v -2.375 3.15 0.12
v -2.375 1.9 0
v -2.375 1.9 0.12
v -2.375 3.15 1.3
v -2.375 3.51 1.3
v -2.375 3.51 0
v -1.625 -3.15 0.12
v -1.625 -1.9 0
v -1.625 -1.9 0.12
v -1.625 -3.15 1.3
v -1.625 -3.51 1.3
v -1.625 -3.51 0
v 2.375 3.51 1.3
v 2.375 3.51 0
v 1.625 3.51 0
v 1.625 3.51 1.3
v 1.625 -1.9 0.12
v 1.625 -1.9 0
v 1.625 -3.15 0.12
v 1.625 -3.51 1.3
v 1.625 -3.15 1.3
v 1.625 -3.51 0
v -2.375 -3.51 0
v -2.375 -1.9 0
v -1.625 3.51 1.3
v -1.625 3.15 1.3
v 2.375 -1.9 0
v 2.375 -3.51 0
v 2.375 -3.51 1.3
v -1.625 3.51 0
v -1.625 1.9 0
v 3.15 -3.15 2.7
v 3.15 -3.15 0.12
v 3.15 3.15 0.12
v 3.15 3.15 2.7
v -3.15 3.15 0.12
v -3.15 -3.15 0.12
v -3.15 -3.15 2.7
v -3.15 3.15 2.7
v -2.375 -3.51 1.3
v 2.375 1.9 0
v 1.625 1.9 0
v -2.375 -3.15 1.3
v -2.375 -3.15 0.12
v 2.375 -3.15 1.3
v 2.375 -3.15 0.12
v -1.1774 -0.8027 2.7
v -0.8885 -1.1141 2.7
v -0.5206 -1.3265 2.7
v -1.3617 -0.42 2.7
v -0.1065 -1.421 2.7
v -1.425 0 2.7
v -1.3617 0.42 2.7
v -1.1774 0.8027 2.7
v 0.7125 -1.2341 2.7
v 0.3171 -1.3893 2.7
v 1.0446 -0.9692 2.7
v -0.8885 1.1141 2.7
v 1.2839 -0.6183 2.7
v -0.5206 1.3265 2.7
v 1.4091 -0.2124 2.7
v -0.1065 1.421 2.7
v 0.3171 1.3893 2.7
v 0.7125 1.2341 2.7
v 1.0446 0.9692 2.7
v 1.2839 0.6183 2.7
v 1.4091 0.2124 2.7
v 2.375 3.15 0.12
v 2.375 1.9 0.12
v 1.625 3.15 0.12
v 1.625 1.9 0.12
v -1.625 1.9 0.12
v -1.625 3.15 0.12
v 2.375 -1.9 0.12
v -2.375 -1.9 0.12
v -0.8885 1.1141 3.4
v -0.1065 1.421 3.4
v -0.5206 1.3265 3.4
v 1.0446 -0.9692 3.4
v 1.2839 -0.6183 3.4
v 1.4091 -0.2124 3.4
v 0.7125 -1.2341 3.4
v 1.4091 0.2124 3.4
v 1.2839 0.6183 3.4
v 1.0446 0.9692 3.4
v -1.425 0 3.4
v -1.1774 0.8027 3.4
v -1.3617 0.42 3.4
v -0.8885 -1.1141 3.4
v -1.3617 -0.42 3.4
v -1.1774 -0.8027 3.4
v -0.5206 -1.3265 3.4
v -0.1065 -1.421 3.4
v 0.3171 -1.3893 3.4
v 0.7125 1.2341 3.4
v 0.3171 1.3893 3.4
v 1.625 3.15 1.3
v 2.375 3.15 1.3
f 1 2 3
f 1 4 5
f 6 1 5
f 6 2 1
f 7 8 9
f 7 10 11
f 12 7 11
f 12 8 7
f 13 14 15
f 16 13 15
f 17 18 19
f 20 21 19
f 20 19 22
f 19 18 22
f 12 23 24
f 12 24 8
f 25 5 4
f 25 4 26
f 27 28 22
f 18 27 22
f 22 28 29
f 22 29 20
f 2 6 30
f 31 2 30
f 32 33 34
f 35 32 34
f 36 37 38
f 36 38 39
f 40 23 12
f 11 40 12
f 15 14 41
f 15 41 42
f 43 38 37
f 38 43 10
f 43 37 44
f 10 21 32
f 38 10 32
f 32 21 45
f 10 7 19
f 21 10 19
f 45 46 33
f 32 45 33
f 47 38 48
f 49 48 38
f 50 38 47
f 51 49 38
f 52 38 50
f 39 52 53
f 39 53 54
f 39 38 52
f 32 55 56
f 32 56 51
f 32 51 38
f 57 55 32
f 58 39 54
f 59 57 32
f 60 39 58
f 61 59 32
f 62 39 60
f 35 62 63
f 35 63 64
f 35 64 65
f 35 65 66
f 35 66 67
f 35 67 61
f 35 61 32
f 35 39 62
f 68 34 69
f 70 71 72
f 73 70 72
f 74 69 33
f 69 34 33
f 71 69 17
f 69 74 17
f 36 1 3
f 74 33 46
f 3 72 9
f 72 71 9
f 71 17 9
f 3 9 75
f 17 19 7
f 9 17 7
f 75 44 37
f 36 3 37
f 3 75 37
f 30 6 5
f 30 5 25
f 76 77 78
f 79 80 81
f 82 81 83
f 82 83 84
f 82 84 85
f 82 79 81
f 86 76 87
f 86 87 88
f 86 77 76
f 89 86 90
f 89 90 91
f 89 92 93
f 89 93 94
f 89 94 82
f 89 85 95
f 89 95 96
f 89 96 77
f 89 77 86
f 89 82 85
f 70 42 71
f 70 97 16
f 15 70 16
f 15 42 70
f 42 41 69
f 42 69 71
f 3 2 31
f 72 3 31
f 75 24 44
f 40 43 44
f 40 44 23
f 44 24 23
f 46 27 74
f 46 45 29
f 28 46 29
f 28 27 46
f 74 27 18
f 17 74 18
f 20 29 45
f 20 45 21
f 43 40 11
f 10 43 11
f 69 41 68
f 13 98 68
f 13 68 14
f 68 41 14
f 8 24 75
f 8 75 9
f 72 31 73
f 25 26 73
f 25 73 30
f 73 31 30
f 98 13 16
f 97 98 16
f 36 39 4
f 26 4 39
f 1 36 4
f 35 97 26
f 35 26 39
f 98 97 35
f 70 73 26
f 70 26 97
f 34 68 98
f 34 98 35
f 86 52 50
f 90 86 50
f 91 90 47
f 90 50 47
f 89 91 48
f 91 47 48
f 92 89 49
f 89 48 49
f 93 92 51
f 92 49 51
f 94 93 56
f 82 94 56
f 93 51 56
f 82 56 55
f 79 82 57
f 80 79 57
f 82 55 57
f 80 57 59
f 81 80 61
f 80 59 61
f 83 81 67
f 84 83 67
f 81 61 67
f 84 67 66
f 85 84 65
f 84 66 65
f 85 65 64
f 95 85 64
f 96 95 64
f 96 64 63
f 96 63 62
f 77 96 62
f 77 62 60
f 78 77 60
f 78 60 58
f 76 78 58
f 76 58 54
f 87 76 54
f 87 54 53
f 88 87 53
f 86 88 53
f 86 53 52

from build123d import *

# Parameters (mm, degrees)
SKIZZE1_W                                  = 6.3
SKIZZE1_H                                  = 6.3
AUFSATZ_LINEAR_AUSTRAGEN1_DEPTH            = 2.7
SKIZZE2_R                                  = 1.425
AUFSATZ_LINEAR_AUSTRAGEN2_DEPTH            = 3.4
FL_CHE_VERSCHIEBEN1_BY                     = 0.12
SKIZZE3_W                                  = 0.75
SKIZZE3_H                                  = 1.61
AUFSATZ_LINEAR_AUSTRAGEN3_DEPTH            = 1.3
SPIEGELN1_AT_THE_SECOND_PLANE_COPY_1_SKE_W = 0.75
SPIEGELN1_AT_THE_SECOND_PLANE_COPY_1_SKE_H = 1.61
SPIEGELN1_AT_THE_SECOND_PLANE_COPY_1_DEPTH = 1.3


with BuildPart() as part:
    # Skizze1 → Aufsatz-Linear austragen1 (new body)
    with BuildSketch(Plane.XY):
        Rectangle(SKIZZE1_W, SKIZZE1_H)
    extrude(amount=AUFSATZ_LINEAR_AUSTRAGEN1_DEPTH)

    # Skizze2 → Aufsatz-Linear austragen2 (add)
    with BuildSketch(Plane.XY):
        with Locations(Location((0, 0, 0), (0, 0, 180))):
            Circle(SKIZZE2_R)
    extrude(amount=AUFSATZ_LINEAR_AUSTRAGEN2_DEPTH)

    # Fläche verschieben1: a face moved inward by 0.12
    extrude(part.faces().sort_by_distance((0, 0, 0))[0], amount=FL_CHE_VERSCHIEBEN1_BY, dir=(0, 0, 1), mode=Mode.SUBTRACT)

    # Skizze3 → Aufsatz-Linear austragen3 (add)
    with BuildSketch(Plane.XY):
        with Locations((-2, 2.705)):
            Rectangle(SKIZZE3_W, SKIZZE3_H)
    aufsatz_linear_austragen3 = extrude(amount=AUFSATZ_LINEAR_AUSTRAGEN3_DEPTH)

    # Spiegeln1: Aufsatz-Linear austragen3 across plane
    add(aufsatz_linear_austragen3.mirror(Plane.ZX))

    # Spiegeln1 at the second plane: Aufsatz-Linear austragen3 across plane
    add(aufsatz_linear_austragen3.mirror(Plane(origin=(0, 0, 0), x_dir=(0, 0, 1), z_dir=(1, 0, 0))))

    # Spiegeln1 at the second plane copy 1 ske → Spiegeln1 at the second plane copy 1 (add)
    with BuildSketch(Plane(origin=(0, 0, 0), x_dir=(-1, 0, 0), z_dir=(0, 0, 1))):
        with Locations((-2, 2.705)):
            Rectangle(SPIEGELN1_AT_THE_SECOND_PLANE_COPY_1_SKE_W, SPIEGELN1_AT_THE_SECOND_PLANE_COPY_1_SKE_H)
    extrude(amount=SPIEGELN1_AT_THE_SECOND_PLANE_COPY_1_DEPTH)


solid = part.part
